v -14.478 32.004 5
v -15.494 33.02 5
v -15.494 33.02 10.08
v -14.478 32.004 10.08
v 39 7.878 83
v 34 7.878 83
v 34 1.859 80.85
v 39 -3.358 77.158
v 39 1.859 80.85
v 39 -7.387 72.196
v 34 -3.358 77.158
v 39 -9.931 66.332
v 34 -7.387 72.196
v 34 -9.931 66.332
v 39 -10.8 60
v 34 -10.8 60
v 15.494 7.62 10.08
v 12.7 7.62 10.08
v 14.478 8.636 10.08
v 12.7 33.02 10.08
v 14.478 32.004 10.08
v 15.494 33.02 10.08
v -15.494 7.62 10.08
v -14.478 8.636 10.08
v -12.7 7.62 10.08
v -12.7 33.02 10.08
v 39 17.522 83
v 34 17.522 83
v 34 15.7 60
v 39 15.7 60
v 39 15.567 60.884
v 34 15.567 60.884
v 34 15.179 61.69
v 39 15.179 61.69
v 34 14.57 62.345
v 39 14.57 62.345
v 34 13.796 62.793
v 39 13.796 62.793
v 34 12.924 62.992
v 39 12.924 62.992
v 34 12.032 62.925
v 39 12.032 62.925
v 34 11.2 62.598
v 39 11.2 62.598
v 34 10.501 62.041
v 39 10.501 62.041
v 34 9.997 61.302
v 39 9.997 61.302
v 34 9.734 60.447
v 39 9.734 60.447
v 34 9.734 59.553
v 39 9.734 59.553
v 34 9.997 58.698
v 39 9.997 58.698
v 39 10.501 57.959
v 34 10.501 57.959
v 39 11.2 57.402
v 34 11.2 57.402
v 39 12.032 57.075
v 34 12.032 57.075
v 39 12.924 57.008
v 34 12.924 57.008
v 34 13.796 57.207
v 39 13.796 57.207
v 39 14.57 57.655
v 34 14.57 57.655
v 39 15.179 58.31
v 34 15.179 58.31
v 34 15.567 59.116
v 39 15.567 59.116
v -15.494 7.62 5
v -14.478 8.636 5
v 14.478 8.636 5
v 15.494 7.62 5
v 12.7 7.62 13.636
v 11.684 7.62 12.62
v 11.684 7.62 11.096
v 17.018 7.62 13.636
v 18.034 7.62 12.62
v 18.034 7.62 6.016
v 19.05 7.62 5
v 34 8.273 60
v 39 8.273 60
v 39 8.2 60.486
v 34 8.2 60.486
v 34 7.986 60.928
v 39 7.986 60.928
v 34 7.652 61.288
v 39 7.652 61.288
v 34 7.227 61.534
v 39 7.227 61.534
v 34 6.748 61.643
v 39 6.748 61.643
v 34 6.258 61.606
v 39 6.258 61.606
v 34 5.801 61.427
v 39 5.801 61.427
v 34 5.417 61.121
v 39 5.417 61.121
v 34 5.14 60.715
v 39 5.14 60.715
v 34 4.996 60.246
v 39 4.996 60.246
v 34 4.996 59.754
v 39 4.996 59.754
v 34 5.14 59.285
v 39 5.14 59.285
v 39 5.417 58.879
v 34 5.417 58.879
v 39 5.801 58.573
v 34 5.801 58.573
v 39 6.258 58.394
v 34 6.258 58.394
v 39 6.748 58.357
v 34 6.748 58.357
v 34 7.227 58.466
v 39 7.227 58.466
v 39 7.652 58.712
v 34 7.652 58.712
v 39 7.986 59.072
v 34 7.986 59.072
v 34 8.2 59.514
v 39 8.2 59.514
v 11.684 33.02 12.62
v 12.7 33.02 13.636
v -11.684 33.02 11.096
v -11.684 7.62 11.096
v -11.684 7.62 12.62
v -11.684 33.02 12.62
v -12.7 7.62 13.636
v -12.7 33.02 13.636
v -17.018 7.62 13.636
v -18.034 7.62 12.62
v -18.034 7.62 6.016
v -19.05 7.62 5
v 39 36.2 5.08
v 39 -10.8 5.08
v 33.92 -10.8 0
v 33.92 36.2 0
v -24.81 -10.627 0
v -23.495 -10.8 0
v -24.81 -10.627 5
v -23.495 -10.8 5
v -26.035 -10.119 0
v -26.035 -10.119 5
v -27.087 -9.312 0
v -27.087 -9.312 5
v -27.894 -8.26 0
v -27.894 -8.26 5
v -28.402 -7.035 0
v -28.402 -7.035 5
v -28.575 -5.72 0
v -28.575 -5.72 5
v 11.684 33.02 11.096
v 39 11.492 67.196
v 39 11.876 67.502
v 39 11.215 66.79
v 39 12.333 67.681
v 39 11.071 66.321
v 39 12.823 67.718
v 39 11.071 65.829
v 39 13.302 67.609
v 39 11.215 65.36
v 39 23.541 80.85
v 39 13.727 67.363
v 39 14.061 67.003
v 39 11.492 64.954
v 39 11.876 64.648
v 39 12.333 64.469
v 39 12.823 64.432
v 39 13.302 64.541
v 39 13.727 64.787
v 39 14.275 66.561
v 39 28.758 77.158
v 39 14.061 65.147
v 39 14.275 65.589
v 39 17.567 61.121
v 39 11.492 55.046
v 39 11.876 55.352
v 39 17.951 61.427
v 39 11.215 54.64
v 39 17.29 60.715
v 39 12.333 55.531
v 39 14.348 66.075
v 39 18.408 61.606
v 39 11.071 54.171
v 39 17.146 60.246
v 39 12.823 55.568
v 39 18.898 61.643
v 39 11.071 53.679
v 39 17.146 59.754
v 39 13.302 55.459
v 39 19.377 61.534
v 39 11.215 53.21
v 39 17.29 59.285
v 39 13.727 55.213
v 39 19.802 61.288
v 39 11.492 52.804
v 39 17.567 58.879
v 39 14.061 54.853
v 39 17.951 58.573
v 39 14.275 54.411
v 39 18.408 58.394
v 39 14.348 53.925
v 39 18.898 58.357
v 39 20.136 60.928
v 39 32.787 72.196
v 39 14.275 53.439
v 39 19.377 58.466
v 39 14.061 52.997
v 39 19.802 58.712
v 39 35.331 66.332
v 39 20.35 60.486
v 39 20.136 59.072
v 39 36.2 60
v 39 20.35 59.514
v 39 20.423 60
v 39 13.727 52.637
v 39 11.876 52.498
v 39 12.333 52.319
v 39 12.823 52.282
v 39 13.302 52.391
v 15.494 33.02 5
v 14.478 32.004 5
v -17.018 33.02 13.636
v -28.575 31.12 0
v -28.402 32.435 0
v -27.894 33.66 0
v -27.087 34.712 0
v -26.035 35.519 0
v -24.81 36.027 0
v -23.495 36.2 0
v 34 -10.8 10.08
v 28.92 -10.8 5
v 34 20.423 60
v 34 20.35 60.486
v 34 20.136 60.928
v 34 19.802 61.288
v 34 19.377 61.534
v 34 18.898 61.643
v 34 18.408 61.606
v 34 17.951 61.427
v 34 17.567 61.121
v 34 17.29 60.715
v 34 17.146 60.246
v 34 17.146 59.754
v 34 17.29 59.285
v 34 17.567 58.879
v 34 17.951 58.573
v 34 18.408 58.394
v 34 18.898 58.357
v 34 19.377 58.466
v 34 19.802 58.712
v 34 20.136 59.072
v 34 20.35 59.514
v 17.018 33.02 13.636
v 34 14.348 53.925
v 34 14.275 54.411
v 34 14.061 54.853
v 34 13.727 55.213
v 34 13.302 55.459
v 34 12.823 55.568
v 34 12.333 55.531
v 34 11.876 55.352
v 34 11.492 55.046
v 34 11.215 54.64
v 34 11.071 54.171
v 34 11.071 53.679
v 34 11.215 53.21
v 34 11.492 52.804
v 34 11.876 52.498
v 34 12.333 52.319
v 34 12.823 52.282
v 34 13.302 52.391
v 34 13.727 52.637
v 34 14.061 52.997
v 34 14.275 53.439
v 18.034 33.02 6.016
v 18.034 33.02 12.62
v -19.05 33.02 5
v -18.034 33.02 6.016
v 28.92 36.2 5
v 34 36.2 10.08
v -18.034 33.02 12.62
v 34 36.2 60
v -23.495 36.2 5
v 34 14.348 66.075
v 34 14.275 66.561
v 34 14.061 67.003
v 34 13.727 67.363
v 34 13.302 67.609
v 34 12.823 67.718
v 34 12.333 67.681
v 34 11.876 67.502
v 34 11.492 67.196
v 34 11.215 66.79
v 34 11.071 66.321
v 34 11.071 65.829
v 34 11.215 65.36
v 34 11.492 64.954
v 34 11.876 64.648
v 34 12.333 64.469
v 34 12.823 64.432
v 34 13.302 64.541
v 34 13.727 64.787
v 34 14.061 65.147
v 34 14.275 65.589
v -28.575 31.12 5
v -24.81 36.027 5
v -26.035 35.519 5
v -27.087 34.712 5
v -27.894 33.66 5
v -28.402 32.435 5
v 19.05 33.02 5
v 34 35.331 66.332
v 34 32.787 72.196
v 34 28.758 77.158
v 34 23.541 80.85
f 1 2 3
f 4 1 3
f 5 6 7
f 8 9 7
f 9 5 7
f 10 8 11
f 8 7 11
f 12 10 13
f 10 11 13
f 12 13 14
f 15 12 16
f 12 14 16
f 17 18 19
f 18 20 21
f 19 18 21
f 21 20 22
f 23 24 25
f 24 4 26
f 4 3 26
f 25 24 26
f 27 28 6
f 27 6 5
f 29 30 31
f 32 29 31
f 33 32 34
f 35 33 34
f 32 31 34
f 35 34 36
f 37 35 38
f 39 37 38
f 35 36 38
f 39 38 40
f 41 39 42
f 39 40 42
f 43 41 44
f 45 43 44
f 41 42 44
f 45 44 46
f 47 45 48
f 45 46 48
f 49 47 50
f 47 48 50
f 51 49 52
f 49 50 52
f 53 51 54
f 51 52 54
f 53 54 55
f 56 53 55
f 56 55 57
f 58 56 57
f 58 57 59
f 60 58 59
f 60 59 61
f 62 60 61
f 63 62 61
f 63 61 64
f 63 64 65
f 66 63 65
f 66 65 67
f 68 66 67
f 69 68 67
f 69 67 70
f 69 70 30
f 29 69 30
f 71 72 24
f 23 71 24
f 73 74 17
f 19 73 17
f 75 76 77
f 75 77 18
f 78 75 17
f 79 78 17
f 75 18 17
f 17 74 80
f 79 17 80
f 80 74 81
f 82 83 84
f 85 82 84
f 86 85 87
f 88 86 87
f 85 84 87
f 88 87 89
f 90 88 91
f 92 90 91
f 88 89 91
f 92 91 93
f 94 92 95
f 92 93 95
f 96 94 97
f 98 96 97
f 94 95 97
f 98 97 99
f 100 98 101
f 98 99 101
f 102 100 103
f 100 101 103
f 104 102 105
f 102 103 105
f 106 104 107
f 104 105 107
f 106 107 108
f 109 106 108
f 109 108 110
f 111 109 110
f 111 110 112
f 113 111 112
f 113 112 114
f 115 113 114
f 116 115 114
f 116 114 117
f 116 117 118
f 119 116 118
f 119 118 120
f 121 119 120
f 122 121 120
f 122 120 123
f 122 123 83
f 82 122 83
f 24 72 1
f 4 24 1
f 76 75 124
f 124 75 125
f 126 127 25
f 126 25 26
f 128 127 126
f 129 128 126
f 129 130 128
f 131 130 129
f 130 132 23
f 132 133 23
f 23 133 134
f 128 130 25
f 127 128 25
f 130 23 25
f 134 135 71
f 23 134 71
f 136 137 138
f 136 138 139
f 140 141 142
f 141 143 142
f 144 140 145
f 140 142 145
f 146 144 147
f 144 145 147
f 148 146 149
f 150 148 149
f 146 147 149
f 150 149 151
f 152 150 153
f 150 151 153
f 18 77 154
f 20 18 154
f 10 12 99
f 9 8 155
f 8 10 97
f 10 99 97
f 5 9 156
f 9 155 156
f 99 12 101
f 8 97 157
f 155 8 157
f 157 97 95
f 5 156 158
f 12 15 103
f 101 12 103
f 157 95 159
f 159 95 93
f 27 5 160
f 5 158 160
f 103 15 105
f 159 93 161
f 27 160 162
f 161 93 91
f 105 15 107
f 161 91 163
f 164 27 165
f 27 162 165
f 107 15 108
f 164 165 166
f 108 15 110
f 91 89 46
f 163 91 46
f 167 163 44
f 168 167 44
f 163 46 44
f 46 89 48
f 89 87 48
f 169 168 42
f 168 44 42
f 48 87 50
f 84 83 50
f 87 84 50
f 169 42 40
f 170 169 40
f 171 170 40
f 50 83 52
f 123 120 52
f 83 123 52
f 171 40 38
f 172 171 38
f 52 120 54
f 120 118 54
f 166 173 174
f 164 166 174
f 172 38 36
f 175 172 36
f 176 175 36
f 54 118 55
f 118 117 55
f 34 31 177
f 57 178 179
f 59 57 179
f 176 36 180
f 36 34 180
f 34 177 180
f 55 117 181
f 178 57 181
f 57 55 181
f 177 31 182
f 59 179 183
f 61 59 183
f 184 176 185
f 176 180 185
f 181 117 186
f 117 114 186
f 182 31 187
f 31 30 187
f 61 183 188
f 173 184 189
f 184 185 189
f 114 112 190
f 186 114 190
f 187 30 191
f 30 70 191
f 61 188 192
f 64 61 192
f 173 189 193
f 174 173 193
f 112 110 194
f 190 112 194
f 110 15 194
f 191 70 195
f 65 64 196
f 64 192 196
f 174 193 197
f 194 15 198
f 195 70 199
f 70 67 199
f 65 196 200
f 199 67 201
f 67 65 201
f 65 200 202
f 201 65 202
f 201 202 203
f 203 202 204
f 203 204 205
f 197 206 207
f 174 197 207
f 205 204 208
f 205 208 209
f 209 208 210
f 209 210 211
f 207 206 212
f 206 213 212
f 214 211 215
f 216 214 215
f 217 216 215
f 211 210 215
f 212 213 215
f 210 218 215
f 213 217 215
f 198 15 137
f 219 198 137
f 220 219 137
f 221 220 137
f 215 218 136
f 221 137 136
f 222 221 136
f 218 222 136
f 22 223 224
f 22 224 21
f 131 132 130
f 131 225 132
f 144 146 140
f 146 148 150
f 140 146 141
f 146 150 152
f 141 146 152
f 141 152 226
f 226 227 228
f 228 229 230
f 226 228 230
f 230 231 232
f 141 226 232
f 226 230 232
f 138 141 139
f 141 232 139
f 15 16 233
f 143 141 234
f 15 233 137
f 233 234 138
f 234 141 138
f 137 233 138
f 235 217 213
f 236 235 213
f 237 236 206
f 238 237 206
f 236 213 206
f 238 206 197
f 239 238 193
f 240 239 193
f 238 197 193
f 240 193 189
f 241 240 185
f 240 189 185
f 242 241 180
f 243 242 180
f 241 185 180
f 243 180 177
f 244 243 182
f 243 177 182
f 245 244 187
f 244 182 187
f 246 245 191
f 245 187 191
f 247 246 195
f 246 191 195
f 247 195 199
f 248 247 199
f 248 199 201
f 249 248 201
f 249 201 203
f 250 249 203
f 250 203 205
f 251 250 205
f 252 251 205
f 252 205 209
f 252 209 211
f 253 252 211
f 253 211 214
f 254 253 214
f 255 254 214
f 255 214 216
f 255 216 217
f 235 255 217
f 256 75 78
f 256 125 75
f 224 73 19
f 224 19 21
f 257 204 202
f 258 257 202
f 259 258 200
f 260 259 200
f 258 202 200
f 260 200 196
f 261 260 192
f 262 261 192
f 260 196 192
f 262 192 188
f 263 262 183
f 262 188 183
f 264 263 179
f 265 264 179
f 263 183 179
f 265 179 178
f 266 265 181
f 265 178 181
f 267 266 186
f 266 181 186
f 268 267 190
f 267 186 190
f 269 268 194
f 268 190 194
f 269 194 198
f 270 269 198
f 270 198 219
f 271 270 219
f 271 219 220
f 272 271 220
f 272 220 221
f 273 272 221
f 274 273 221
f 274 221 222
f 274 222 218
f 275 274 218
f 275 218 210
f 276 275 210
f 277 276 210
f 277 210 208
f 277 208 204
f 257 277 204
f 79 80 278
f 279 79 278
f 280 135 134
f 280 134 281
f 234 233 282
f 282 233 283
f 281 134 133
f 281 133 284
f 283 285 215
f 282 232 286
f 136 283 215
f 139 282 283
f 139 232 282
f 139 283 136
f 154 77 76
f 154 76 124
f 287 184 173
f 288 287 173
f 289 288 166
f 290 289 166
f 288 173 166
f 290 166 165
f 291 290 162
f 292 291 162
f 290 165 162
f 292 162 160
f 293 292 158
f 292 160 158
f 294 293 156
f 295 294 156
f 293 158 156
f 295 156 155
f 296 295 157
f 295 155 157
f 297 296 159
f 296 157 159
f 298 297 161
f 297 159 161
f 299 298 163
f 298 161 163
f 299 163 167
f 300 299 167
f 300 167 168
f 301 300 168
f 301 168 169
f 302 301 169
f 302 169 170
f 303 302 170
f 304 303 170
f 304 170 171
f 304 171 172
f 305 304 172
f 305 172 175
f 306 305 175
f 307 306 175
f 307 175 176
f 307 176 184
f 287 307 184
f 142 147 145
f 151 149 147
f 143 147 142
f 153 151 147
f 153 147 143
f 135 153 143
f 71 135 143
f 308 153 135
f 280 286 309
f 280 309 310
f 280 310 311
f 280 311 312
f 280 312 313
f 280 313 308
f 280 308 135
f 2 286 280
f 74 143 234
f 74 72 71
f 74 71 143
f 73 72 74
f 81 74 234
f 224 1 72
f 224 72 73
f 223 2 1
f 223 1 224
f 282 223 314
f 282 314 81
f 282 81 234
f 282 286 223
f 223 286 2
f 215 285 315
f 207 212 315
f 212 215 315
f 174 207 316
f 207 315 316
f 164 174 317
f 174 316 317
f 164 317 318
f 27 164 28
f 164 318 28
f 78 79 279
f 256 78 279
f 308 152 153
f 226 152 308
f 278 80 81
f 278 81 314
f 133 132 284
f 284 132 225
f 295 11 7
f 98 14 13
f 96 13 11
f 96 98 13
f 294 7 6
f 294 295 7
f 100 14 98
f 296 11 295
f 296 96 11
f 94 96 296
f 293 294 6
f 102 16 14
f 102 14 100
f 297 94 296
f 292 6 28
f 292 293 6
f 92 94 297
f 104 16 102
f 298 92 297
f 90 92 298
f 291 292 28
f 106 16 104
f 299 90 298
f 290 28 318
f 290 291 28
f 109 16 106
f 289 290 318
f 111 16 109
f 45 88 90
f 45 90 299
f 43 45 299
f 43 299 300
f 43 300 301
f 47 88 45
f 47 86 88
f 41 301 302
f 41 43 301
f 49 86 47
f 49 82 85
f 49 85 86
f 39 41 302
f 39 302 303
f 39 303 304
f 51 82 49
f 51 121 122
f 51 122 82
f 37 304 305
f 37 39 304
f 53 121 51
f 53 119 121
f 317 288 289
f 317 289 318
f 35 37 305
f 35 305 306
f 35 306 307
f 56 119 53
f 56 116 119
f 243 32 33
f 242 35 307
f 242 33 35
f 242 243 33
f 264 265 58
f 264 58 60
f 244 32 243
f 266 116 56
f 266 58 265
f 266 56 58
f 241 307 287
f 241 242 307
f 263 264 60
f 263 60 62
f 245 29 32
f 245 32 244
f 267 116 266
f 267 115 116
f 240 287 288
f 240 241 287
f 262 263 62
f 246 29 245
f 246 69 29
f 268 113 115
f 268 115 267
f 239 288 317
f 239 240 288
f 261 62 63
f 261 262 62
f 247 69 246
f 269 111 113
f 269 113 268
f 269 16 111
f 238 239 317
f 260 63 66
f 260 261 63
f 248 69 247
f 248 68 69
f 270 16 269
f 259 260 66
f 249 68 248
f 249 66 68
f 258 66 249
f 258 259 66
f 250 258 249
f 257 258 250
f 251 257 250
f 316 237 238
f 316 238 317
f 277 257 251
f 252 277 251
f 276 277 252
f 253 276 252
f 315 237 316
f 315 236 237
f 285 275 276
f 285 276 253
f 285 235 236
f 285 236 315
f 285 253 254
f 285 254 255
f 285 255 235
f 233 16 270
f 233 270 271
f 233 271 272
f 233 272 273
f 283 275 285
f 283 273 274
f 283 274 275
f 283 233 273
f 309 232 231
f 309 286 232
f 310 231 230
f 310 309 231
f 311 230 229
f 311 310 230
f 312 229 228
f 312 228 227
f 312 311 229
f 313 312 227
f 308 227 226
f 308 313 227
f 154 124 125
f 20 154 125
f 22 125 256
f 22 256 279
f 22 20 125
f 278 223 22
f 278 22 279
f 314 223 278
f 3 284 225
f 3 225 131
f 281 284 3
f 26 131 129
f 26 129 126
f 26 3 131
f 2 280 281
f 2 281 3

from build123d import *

# Parameters (mm, degrees)
F0_W      = 57.15
F0_H      = 21.6
F1_DEPTH  = 5
F2_W      = 57.15
F2_H      = 25.4
F3_DEPTH  = 5
F4_W      = 3.556
F4_H      = 25.4
F5_DEPTH  = 5.08
F6_W      = 6.35
F6_H      = 25.4
F7_DEPTH  = 3.556
F8_SIZE   = 1.016
F9_W      = 10.425
F9_H      = 47
F10_DEPTH = 5
F11_W     = 5
F11_H     = 47
F12_DEPTH = 78
F13_R     = 1.6478
F13_R_2   = 3
F14_DEPTH = 25.4
F16_DEPTH = 25.4
F17_R     = 5.08
F18_SIZE  = 5.08


with BuildPart() as f1:
    # F0 (on Top) → F1 (new body)
    with BuildSketch(Plane.XY):
        Rectangle(F0_W, F0_H)
    extrude(amount=F1_DEPTH)

    # F2 (on Top) → F3 (join)
    with BuildSketch(Plane.XY):
        with Locations((0, 23.5)):
            Rectangle(F2_W, F2_H)
    extrude(amount=F3_DEPTH)

    # F4 (on face) → F5 (join)
    with BuildSketch(Plane.XY.offset(5)):
        with Locations((-16.256, 20.32)):
            Rectangle(F4_W, F4_H)
        with Locations((16.256, 20.32)):
            Rectangle(F4_W, F4_H)
    extrude(amount=F5_DEPTH)

    # F6 (on face) → F7 (join)
    with BuildSketch(Plane.XY.offset(10.08)):
        with Locations((-14.859, 20.32)):
            Rectangle(F6_W, F6_H)
        with Locations((14.859, 20.32)):
            Rectangle(F6_W, F6_H)
    extrude(amount=F7_DEPTH)

    # F8
    f8_edges = [f1.edges().sort_by_distance(p)[0] for p in [
        (-11.684, 20.32, 13.636),
        (-11.684, 20.32, 10.08),
        (11.684, 20.32, 13.636),
        (11.684, 20.32, 10.08),
        (18.034, 20.32, 13.636),
        (-18.034, 20.32, 13.636),
        (18.034, 20.32, 5),
        (-18.034, 20.32, 5),
        (14.478, 33.02, 7.54),
        (-14.478, 33.02, 7.54),
        (-14.478, 7.62, 7.54),
        (14.478, 7.62, 7.54),
    ]]
    chamfer(f8_edges, length=F8_SIZE)

    # F9 (on face) → F10 (join)
    with BuildSketch(Plane.XY.offset(5)):
        with Locations((33.7875, 12.7)):
            Rectangle(F9_W, F9_H)
    extrude(amount=-F10_DEPTH)

    # F11 (on face) → F12 (join)
    with BuildSketch(Plane.XY.offset(5)):
        with Locations((36.5, 12.7)):
            Rectangle(F11_W, F11_H)
    extrude(amount=F12_DEPTH)

    # F13 (on face) → F14 (cut)
    with BuildSketch(Plane.YZ.offset(39)):
        with Locations((6.625, 60)):
            Circle(F13_R)
        with Locations((12.7, 53.925)):
            Circle(F13_R)
        with Locations((18.775, 60)):
            Circle(F13_R)
        with Locations((12.7, 66.075)):
            Circle(F13_R)
        with Locations((12.7, 60)):
            Circle(F13_R_2)
    extrude(amount=-F14_DEPTH, mode=Mode.SUBTRACT)

    # F15 (on face) → F16 (cut)
    with BuildSketch(Plane(origin=(34, 0, 0), x_dir=(0, -1, 0), z_dir=(-1, 0, 0))):
        with BuildLine():
            ThreePointArc((-36.2, 60), (-30.942298, 74.814471), (-17.521825, 83))
            Line((-17.521825, 83), (-36.2, 83))
            Line((-36.2, 83), (-36.2, 60))
        make_face()
        with BuildLine():
            Line((-17.521825, 83), (-7.878175, 83))
            ThreePointArc((-7.878175, 83), (-12.7, 83.5), (-17.521825, 83))
        make_face()
        with BuildLine():
            ThreePointArc((-7.878175, 83), (5.542298, 74.814471), (10.8, 60))
            Line((10.8, 60), (10.8, 83))
            Line((10.8, 83), (-7.878175, 83))
        make_face()
    extrude(amount=-F16_DEPTH, mode=Mode.SUBTRACT)

    # F17
    f17_edges = [f1.edges().sort_by_distance(p)[0] for p in [
        (-28.575, -10.8, 2.5),
        (-28.575, 36.2, 2.5),
    ]]
    fillet(f17_edges, radius=F17_R)

    # F18
    f18_edges = [f1.edges().sort_by_distance(p)[0] for p in [
        (34, 12.7, 5),
        (39, 12.7, 0),
    ]]
    chamfer(f18_edges, length=F18_SIZE)


solid = f1.part
